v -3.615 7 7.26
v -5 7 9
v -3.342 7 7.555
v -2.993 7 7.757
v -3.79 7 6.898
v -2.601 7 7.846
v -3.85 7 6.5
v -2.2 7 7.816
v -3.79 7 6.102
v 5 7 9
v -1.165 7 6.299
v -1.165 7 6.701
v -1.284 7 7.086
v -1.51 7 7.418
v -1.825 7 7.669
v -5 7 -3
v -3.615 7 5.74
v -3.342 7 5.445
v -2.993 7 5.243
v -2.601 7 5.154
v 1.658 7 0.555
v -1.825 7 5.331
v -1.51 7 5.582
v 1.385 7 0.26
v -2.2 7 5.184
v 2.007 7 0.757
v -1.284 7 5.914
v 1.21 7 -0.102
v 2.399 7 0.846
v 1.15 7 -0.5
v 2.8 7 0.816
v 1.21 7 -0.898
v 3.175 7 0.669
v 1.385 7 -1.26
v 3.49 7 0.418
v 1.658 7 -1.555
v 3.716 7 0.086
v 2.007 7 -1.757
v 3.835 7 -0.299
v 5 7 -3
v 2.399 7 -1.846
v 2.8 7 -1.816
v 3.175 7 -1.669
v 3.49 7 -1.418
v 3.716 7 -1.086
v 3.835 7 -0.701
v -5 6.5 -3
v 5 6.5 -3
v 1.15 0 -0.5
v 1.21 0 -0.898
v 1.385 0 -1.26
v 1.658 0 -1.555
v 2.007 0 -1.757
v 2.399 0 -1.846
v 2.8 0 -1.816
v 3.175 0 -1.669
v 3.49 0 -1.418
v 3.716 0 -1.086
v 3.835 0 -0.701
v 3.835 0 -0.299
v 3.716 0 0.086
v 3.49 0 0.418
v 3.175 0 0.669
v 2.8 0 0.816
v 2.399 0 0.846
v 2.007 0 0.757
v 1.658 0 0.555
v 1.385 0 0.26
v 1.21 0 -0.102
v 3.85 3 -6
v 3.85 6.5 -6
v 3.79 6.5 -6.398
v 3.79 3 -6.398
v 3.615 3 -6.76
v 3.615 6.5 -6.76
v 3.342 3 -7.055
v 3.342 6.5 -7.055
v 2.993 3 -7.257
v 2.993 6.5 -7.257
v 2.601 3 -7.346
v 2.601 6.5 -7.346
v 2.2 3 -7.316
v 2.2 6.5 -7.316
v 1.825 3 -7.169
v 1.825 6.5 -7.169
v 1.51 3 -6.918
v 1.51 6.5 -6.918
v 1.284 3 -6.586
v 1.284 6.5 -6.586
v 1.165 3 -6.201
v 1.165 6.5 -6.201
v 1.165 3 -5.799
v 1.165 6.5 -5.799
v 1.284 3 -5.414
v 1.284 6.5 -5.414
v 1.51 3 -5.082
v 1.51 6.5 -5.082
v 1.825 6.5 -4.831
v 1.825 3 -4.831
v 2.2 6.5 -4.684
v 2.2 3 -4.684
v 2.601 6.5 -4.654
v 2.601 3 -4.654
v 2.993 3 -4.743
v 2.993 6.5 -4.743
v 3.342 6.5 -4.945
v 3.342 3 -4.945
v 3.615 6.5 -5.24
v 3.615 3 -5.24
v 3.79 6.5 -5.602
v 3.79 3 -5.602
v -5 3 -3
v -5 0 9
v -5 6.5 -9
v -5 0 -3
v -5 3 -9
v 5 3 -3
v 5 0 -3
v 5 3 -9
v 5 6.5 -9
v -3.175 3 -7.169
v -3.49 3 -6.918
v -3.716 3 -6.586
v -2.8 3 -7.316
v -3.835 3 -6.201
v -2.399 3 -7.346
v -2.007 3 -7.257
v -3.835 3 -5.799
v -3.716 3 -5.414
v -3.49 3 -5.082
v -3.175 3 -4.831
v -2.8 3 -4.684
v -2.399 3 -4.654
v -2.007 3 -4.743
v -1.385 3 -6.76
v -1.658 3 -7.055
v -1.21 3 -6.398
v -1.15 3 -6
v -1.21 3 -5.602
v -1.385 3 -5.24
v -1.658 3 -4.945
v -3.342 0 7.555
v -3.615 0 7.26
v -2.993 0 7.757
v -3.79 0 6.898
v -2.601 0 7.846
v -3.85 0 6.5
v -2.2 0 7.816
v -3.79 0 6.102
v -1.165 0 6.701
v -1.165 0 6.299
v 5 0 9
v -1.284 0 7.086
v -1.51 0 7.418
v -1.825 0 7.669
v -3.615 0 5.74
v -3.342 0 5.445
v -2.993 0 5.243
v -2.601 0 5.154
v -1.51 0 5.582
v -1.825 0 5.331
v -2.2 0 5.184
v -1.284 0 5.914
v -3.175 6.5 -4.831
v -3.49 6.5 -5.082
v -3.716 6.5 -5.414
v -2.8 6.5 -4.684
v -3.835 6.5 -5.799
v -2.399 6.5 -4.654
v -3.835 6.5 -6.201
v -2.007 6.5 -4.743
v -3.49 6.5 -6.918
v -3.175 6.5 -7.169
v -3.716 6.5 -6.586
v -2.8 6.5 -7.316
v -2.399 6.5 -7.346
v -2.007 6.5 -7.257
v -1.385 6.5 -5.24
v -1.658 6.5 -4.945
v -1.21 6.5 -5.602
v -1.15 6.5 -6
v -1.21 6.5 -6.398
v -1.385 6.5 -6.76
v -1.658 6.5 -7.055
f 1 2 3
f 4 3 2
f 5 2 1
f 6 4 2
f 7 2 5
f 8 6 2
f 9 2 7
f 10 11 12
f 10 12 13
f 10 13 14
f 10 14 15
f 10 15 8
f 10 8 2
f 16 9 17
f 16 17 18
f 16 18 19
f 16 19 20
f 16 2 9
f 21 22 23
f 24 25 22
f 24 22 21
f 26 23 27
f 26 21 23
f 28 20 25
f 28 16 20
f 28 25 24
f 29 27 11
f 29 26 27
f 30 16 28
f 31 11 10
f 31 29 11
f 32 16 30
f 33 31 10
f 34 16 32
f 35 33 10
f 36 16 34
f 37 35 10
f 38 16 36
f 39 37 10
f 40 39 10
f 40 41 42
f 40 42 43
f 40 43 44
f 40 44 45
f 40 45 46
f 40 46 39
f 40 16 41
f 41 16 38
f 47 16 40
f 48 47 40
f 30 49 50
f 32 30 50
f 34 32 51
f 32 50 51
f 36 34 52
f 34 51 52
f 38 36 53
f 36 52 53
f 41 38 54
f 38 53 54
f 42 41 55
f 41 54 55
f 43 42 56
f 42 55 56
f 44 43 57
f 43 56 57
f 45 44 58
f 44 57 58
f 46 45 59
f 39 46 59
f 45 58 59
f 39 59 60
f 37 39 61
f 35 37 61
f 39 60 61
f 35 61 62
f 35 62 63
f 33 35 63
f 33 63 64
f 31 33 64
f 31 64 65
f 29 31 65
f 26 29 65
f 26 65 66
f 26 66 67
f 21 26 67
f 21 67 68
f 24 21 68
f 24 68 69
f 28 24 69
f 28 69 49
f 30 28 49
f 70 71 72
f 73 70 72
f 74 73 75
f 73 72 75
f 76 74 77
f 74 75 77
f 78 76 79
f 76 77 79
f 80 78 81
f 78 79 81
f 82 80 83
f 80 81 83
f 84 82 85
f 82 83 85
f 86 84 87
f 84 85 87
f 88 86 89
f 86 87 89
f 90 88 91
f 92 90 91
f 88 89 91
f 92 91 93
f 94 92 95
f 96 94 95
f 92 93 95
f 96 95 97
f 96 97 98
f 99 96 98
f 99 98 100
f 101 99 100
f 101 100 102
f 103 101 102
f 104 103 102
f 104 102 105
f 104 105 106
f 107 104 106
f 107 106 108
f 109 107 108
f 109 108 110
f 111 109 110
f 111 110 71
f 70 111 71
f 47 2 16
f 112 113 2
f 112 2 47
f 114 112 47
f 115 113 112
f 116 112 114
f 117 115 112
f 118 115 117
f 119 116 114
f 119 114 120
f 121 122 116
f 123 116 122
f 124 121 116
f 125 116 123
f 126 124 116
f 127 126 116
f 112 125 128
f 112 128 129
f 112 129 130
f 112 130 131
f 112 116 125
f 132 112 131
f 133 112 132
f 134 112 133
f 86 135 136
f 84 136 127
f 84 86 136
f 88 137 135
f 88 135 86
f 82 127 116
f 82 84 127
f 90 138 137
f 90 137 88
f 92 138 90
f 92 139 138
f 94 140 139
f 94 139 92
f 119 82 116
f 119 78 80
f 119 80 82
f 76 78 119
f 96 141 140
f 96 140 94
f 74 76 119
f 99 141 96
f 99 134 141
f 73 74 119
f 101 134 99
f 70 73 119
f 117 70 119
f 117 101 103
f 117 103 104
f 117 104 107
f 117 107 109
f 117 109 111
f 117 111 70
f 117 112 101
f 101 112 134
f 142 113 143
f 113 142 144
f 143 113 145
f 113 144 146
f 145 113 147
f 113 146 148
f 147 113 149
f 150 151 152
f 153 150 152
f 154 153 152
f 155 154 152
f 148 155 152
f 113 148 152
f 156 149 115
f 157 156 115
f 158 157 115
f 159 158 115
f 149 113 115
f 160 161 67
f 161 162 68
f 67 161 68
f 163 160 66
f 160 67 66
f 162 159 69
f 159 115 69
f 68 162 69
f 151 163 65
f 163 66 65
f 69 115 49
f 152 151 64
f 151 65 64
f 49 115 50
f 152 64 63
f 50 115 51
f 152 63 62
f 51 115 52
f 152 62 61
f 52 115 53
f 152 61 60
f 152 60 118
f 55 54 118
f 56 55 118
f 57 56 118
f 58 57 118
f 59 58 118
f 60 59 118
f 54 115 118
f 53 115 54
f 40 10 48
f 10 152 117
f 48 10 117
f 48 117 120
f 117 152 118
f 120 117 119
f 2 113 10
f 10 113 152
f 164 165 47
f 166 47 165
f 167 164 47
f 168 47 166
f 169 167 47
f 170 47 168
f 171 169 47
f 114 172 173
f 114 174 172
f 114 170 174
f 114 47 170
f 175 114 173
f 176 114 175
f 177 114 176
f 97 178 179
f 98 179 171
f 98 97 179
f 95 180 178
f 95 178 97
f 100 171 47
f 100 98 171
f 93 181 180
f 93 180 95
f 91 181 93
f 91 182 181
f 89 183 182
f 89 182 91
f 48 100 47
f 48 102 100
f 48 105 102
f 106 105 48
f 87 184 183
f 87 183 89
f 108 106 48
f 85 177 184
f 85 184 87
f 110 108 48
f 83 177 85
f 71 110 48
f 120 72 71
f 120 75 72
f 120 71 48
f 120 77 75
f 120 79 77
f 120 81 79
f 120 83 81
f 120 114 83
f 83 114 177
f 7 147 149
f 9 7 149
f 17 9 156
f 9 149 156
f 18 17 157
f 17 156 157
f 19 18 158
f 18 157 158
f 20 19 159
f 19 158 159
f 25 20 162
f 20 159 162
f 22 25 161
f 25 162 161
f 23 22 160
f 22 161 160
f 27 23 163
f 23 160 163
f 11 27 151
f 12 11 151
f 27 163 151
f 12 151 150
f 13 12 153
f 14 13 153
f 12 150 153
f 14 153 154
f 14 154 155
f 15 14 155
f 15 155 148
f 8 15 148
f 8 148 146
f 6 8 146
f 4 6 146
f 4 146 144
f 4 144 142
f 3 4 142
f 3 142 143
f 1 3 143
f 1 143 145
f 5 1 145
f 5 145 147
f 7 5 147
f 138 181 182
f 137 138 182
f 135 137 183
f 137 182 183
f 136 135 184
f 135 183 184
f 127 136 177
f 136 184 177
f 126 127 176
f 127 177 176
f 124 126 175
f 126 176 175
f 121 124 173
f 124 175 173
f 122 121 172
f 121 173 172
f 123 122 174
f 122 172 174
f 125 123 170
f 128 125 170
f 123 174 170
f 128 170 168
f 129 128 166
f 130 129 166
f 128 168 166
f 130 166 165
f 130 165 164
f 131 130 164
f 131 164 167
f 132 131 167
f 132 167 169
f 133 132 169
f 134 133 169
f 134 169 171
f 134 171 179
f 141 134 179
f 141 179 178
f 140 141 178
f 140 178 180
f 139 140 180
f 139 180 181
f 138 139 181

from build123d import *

# Parameters (mm, degrees)
SKETCH1_W              = 10
SKETCH1_H              = 18
BOSS_EXTRUDE1_DEPTH    = 7
SKETCH2_W              = 10
SKETCH2_H              = 6
CUT_EXTRUDE1_DEPTH     = 0.5
M2_5_CLEARANCE_HOLE1_D = 2.7
SKETCH5_W              = 10
SKETCH5_H              = 6
CUT_EXTRUDE2_DEPTH     = 3
M2_5_CLEARANCE_HOLE2_D = 2.7


with BuildPart() as part:
    # Sketch1 → Boss-Extrude1 (new body)
    with BuildSketch(Plane(origin=(0, 0, 0), x_dir=(1, 0, 0), z_dir=(0, 1, 0))):
        Rectangle(SKETCH1_W, SKETCH1_H)
    extrude(amount=BOSS_EXTRUDE1_DEPTH)

    # Sketch2 → Cut-Extrude1 (cut)
    with BuildSketch(Plane(origin=(0, 7, 0), x_dir=(1, 0, 0), z_dir=(0, 1, 0))):
        with Locations((0, 6)):
            Rectangle(SKETCH2_W, SKETCH2_H)
    extrude(amount=-CUT_EXTRUDE1_DEPTH, mode=Mode.SUBTRACT)

    # M2.5 Clearance Hole1 (through all)
    with Locations(Plane(origin=(0, 7, 0), x_dir=(1, 0, 0), z_dir=(0, 1, 0))):
        with Locations((-2.5, -6.5), (2.5, 0.5)):
            Hole(M2_5_CLEARANCE_HOLE1_D / 2)

    # Sketch5 → Cut-Extrude2 (cut)
    with BuildSketch(Plane.XZ):
        with Locations((0, -6)):
            Rectangle(SKETCH5_W, SKETCH5_H)
    extrude(amount=-CUT_EXTRUDE2_DEPTH, mode=Mode.SUBTRACT)

    # M2.5 Clearance Hole2 (through all)
    with Locations(Plane(origin=(0, 3, 0), x_dir=(-1, 0, 0), z_dir=(0, -1, 0))):
        with Locations((-2.5, 6), (2.5, 6)):
            Hole(M2_5_CLEARANCE_HOLE2_D / 2)


solid = part.part
